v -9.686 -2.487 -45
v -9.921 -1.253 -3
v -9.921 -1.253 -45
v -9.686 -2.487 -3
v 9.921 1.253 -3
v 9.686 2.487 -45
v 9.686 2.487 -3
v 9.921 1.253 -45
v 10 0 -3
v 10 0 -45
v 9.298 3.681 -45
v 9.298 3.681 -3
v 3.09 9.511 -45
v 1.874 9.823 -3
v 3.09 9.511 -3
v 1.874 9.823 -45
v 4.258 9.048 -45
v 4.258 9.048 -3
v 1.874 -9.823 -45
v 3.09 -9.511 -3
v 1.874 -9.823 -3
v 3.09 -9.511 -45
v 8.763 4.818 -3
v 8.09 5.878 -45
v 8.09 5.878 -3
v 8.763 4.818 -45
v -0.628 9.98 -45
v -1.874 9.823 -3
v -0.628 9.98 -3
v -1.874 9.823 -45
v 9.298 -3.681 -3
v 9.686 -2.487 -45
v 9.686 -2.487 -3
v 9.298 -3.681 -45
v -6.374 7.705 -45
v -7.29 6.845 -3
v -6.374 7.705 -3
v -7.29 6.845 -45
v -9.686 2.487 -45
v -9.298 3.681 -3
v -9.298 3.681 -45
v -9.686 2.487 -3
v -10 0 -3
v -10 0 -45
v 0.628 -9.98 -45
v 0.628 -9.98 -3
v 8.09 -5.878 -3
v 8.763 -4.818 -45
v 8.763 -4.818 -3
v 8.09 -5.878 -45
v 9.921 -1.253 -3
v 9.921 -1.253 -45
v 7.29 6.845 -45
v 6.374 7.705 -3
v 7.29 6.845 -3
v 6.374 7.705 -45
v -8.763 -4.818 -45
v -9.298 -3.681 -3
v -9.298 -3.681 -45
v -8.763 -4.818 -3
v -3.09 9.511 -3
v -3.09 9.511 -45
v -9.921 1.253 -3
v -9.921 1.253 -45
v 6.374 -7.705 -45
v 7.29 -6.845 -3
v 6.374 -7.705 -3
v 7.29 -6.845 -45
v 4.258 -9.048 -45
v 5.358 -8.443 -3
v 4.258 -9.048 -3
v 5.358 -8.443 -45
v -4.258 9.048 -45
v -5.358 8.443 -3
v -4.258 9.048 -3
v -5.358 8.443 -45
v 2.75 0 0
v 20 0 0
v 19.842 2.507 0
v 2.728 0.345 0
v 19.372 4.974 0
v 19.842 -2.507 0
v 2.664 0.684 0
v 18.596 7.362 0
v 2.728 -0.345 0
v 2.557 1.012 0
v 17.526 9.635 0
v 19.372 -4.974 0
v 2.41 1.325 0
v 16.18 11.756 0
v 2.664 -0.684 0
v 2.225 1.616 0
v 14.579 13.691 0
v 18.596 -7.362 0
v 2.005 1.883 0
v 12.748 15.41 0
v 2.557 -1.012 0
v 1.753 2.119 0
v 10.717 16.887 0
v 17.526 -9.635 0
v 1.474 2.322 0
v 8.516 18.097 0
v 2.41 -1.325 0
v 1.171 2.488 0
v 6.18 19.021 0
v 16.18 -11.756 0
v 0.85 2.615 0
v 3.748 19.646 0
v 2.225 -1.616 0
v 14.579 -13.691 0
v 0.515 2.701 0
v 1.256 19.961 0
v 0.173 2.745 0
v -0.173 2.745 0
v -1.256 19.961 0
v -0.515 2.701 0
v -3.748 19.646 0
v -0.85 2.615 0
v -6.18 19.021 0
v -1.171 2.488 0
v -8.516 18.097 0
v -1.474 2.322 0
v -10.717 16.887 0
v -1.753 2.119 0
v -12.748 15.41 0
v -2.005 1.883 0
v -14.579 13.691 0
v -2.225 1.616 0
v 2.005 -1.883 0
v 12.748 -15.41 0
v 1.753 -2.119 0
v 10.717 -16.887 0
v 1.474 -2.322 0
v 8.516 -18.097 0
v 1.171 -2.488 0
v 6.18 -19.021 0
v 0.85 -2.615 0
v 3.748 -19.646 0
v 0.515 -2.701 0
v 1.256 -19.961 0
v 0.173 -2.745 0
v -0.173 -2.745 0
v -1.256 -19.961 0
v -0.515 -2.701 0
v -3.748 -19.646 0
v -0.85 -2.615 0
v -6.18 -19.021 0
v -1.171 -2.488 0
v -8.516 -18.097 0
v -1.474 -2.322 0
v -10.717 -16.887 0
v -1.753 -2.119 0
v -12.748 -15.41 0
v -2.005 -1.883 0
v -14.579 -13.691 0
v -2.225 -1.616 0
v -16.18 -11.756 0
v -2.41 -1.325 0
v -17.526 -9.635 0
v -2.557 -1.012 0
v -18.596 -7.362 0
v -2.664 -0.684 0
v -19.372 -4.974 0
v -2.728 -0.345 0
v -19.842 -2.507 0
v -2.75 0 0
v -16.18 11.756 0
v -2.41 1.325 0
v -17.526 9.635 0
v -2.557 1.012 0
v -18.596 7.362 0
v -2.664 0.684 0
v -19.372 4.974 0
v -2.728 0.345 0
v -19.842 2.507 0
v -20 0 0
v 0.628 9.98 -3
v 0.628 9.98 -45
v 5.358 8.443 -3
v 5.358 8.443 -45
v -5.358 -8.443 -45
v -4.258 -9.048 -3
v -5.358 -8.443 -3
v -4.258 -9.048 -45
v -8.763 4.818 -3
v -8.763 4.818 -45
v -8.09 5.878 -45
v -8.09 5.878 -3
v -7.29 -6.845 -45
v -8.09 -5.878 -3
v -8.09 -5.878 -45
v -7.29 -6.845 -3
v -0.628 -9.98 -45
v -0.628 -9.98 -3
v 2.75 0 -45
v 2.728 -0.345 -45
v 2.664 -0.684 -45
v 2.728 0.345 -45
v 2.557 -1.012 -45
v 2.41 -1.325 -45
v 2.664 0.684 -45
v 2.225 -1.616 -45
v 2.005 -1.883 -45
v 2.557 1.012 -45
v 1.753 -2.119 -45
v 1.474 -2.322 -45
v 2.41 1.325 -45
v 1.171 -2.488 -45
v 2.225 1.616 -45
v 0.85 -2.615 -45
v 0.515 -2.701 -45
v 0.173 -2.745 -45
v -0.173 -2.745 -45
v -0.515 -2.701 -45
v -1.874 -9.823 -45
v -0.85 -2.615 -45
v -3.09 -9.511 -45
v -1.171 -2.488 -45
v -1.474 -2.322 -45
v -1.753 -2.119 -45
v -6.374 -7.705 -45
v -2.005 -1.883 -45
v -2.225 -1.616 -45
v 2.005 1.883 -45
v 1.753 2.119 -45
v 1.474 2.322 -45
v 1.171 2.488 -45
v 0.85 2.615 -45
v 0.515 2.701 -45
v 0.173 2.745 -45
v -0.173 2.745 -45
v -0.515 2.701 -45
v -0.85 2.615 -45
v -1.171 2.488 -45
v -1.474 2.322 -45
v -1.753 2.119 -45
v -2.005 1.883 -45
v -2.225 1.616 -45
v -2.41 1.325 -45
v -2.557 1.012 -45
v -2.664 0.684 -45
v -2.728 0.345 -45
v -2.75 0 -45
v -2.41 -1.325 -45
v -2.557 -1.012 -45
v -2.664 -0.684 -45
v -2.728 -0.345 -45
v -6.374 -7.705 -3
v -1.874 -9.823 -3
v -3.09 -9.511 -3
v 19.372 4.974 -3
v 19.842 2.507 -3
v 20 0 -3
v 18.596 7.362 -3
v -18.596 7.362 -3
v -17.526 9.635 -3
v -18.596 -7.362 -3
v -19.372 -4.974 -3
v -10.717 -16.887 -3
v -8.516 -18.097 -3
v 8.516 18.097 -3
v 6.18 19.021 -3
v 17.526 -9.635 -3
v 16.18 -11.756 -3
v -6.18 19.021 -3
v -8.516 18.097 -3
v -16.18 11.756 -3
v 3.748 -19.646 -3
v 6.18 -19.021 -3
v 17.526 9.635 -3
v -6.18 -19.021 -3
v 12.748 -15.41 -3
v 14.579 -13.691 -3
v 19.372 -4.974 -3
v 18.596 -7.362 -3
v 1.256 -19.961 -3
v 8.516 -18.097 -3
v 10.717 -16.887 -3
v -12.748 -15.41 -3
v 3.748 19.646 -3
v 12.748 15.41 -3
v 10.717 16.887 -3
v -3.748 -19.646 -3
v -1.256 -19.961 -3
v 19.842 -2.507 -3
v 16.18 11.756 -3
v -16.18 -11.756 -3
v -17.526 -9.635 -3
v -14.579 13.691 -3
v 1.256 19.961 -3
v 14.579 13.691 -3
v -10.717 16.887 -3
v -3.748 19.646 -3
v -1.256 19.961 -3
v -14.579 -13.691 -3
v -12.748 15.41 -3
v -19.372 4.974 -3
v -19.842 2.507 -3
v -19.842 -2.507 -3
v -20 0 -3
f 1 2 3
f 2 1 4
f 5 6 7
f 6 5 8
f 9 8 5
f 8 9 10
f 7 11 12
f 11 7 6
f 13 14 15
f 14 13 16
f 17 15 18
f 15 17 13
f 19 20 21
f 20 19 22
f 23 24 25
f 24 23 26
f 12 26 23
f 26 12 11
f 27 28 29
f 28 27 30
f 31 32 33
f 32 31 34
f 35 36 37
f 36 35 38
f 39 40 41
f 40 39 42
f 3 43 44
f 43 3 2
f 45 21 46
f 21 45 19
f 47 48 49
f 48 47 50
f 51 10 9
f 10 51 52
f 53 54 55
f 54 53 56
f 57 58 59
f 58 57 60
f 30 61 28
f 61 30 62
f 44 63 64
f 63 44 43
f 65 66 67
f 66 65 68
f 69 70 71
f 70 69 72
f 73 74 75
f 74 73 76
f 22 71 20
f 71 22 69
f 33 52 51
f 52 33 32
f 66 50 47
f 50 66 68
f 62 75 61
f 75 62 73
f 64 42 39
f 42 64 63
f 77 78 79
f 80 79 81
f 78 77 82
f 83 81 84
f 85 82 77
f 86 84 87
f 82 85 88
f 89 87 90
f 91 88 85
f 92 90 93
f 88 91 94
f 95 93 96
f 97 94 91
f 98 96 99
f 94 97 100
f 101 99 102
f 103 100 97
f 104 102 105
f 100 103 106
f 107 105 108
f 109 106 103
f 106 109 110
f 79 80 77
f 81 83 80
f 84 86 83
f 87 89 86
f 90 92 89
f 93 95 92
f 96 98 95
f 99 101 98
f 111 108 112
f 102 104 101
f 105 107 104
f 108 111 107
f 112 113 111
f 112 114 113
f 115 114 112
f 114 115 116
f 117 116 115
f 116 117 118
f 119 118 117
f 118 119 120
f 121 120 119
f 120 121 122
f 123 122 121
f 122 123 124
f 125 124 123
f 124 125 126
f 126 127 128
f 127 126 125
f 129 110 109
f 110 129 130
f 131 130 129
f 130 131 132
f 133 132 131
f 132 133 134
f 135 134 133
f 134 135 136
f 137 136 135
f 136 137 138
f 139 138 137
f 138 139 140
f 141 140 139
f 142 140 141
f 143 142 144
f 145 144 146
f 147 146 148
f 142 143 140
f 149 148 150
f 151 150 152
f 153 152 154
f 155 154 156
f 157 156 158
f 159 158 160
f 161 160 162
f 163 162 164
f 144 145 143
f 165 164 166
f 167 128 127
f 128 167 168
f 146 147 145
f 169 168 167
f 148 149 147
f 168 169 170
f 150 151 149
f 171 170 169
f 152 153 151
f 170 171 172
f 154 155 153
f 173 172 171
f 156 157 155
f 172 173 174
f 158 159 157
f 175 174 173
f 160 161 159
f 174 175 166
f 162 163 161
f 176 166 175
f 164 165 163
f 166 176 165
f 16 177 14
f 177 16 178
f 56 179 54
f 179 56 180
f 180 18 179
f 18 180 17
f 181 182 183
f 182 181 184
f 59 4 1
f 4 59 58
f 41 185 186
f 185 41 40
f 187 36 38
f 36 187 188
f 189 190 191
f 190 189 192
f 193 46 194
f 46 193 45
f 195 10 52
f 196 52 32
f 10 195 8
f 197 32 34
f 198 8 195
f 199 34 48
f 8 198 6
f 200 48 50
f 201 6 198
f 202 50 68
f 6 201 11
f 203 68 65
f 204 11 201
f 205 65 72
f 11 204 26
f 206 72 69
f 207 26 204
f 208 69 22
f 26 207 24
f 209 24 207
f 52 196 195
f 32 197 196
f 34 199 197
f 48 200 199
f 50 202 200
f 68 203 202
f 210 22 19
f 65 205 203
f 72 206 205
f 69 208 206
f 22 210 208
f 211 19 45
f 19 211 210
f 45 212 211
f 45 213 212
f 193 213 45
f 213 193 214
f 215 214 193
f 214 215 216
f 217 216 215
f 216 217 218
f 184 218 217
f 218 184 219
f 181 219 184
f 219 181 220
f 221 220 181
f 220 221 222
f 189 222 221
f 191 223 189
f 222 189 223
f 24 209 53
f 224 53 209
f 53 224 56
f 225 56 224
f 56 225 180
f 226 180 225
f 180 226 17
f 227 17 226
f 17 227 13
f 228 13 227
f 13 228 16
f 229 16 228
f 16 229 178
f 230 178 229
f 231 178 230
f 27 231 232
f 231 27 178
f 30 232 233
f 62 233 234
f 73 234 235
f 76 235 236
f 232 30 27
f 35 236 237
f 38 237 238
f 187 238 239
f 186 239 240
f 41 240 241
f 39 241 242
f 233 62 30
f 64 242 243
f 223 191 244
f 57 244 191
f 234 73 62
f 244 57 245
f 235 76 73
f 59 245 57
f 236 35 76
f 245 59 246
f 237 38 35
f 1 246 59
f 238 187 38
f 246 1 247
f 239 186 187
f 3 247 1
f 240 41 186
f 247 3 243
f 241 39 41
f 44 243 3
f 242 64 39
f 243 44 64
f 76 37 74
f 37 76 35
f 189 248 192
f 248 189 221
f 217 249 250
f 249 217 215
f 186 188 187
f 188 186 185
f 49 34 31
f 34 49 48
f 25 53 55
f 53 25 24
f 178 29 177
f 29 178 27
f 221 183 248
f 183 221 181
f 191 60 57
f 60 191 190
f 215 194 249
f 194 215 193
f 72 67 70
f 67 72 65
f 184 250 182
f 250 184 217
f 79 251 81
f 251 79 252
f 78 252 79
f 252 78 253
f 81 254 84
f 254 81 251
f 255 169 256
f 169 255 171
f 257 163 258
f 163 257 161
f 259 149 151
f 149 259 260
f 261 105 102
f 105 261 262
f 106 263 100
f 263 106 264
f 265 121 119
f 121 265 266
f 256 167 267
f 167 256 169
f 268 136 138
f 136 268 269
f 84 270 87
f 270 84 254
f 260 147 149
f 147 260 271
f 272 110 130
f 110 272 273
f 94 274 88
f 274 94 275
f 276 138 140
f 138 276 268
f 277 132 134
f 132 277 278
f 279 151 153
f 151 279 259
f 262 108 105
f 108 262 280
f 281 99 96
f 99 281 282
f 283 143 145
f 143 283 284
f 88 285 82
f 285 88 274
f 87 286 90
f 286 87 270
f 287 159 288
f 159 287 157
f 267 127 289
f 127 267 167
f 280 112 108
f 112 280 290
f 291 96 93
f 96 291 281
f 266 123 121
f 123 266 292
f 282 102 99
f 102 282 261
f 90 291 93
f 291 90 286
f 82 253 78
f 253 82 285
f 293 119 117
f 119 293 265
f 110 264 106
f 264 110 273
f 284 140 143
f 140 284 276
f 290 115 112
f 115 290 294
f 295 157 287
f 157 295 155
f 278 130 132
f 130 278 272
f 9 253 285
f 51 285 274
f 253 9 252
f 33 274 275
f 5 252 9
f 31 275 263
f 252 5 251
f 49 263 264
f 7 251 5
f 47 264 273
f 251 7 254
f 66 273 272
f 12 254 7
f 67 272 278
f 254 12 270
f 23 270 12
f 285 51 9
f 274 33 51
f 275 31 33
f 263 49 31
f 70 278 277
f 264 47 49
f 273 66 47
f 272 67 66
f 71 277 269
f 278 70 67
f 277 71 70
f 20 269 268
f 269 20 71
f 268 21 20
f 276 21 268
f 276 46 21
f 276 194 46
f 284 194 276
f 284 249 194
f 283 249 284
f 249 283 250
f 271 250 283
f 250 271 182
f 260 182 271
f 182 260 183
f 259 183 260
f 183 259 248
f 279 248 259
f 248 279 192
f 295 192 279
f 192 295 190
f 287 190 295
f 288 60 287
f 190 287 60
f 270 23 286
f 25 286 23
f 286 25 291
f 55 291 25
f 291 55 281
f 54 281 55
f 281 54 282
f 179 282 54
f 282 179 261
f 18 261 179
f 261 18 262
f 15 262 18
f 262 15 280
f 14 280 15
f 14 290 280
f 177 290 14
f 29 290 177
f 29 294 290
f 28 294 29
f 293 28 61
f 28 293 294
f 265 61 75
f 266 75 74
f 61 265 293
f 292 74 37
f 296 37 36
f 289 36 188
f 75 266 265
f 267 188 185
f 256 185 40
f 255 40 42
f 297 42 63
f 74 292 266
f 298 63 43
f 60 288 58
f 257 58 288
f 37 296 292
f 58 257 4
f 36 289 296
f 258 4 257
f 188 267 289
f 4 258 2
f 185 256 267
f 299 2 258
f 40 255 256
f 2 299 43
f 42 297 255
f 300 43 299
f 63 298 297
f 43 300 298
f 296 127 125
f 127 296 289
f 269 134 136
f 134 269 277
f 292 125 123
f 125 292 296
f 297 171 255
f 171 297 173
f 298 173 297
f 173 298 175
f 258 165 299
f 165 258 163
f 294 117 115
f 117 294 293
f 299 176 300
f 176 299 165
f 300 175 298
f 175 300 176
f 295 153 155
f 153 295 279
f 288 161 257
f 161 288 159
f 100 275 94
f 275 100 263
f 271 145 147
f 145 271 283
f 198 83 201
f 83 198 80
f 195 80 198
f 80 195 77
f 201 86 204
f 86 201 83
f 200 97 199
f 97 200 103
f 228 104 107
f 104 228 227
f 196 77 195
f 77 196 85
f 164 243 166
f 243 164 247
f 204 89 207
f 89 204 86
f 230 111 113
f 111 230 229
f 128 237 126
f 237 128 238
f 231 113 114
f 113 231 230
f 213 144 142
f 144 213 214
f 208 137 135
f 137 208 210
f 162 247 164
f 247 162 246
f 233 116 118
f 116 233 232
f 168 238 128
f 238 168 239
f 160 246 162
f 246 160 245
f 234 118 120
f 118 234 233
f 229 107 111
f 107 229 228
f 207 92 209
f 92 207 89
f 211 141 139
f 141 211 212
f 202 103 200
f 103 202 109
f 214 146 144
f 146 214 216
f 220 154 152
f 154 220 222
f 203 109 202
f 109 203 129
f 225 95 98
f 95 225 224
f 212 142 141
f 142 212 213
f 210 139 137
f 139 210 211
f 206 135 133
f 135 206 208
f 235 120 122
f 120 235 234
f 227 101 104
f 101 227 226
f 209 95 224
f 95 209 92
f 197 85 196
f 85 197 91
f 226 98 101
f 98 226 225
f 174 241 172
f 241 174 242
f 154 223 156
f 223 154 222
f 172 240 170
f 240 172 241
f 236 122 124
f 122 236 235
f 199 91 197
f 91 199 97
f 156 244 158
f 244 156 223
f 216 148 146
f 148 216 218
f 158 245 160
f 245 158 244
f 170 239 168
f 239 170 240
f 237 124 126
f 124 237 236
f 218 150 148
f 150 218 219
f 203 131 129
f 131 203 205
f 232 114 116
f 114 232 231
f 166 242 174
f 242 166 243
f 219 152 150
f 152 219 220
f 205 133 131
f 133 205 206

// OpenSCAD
$fn = 50;


difference() {
	union() {
		translate(v = [0, 0, -45.0000000000]) {
			cylinder(h = 45, r = 10.0000000000);
		}
		translate(v = [0, 0, -3.0000000000]) {
			cylinder(h = 3, r = 20.0000000000);
		}
	}
	union() {
		#translate(v = [0, 0, -45]) {
			cylinder(h = 45, r = 2.7500000000);
		}
	}
}
